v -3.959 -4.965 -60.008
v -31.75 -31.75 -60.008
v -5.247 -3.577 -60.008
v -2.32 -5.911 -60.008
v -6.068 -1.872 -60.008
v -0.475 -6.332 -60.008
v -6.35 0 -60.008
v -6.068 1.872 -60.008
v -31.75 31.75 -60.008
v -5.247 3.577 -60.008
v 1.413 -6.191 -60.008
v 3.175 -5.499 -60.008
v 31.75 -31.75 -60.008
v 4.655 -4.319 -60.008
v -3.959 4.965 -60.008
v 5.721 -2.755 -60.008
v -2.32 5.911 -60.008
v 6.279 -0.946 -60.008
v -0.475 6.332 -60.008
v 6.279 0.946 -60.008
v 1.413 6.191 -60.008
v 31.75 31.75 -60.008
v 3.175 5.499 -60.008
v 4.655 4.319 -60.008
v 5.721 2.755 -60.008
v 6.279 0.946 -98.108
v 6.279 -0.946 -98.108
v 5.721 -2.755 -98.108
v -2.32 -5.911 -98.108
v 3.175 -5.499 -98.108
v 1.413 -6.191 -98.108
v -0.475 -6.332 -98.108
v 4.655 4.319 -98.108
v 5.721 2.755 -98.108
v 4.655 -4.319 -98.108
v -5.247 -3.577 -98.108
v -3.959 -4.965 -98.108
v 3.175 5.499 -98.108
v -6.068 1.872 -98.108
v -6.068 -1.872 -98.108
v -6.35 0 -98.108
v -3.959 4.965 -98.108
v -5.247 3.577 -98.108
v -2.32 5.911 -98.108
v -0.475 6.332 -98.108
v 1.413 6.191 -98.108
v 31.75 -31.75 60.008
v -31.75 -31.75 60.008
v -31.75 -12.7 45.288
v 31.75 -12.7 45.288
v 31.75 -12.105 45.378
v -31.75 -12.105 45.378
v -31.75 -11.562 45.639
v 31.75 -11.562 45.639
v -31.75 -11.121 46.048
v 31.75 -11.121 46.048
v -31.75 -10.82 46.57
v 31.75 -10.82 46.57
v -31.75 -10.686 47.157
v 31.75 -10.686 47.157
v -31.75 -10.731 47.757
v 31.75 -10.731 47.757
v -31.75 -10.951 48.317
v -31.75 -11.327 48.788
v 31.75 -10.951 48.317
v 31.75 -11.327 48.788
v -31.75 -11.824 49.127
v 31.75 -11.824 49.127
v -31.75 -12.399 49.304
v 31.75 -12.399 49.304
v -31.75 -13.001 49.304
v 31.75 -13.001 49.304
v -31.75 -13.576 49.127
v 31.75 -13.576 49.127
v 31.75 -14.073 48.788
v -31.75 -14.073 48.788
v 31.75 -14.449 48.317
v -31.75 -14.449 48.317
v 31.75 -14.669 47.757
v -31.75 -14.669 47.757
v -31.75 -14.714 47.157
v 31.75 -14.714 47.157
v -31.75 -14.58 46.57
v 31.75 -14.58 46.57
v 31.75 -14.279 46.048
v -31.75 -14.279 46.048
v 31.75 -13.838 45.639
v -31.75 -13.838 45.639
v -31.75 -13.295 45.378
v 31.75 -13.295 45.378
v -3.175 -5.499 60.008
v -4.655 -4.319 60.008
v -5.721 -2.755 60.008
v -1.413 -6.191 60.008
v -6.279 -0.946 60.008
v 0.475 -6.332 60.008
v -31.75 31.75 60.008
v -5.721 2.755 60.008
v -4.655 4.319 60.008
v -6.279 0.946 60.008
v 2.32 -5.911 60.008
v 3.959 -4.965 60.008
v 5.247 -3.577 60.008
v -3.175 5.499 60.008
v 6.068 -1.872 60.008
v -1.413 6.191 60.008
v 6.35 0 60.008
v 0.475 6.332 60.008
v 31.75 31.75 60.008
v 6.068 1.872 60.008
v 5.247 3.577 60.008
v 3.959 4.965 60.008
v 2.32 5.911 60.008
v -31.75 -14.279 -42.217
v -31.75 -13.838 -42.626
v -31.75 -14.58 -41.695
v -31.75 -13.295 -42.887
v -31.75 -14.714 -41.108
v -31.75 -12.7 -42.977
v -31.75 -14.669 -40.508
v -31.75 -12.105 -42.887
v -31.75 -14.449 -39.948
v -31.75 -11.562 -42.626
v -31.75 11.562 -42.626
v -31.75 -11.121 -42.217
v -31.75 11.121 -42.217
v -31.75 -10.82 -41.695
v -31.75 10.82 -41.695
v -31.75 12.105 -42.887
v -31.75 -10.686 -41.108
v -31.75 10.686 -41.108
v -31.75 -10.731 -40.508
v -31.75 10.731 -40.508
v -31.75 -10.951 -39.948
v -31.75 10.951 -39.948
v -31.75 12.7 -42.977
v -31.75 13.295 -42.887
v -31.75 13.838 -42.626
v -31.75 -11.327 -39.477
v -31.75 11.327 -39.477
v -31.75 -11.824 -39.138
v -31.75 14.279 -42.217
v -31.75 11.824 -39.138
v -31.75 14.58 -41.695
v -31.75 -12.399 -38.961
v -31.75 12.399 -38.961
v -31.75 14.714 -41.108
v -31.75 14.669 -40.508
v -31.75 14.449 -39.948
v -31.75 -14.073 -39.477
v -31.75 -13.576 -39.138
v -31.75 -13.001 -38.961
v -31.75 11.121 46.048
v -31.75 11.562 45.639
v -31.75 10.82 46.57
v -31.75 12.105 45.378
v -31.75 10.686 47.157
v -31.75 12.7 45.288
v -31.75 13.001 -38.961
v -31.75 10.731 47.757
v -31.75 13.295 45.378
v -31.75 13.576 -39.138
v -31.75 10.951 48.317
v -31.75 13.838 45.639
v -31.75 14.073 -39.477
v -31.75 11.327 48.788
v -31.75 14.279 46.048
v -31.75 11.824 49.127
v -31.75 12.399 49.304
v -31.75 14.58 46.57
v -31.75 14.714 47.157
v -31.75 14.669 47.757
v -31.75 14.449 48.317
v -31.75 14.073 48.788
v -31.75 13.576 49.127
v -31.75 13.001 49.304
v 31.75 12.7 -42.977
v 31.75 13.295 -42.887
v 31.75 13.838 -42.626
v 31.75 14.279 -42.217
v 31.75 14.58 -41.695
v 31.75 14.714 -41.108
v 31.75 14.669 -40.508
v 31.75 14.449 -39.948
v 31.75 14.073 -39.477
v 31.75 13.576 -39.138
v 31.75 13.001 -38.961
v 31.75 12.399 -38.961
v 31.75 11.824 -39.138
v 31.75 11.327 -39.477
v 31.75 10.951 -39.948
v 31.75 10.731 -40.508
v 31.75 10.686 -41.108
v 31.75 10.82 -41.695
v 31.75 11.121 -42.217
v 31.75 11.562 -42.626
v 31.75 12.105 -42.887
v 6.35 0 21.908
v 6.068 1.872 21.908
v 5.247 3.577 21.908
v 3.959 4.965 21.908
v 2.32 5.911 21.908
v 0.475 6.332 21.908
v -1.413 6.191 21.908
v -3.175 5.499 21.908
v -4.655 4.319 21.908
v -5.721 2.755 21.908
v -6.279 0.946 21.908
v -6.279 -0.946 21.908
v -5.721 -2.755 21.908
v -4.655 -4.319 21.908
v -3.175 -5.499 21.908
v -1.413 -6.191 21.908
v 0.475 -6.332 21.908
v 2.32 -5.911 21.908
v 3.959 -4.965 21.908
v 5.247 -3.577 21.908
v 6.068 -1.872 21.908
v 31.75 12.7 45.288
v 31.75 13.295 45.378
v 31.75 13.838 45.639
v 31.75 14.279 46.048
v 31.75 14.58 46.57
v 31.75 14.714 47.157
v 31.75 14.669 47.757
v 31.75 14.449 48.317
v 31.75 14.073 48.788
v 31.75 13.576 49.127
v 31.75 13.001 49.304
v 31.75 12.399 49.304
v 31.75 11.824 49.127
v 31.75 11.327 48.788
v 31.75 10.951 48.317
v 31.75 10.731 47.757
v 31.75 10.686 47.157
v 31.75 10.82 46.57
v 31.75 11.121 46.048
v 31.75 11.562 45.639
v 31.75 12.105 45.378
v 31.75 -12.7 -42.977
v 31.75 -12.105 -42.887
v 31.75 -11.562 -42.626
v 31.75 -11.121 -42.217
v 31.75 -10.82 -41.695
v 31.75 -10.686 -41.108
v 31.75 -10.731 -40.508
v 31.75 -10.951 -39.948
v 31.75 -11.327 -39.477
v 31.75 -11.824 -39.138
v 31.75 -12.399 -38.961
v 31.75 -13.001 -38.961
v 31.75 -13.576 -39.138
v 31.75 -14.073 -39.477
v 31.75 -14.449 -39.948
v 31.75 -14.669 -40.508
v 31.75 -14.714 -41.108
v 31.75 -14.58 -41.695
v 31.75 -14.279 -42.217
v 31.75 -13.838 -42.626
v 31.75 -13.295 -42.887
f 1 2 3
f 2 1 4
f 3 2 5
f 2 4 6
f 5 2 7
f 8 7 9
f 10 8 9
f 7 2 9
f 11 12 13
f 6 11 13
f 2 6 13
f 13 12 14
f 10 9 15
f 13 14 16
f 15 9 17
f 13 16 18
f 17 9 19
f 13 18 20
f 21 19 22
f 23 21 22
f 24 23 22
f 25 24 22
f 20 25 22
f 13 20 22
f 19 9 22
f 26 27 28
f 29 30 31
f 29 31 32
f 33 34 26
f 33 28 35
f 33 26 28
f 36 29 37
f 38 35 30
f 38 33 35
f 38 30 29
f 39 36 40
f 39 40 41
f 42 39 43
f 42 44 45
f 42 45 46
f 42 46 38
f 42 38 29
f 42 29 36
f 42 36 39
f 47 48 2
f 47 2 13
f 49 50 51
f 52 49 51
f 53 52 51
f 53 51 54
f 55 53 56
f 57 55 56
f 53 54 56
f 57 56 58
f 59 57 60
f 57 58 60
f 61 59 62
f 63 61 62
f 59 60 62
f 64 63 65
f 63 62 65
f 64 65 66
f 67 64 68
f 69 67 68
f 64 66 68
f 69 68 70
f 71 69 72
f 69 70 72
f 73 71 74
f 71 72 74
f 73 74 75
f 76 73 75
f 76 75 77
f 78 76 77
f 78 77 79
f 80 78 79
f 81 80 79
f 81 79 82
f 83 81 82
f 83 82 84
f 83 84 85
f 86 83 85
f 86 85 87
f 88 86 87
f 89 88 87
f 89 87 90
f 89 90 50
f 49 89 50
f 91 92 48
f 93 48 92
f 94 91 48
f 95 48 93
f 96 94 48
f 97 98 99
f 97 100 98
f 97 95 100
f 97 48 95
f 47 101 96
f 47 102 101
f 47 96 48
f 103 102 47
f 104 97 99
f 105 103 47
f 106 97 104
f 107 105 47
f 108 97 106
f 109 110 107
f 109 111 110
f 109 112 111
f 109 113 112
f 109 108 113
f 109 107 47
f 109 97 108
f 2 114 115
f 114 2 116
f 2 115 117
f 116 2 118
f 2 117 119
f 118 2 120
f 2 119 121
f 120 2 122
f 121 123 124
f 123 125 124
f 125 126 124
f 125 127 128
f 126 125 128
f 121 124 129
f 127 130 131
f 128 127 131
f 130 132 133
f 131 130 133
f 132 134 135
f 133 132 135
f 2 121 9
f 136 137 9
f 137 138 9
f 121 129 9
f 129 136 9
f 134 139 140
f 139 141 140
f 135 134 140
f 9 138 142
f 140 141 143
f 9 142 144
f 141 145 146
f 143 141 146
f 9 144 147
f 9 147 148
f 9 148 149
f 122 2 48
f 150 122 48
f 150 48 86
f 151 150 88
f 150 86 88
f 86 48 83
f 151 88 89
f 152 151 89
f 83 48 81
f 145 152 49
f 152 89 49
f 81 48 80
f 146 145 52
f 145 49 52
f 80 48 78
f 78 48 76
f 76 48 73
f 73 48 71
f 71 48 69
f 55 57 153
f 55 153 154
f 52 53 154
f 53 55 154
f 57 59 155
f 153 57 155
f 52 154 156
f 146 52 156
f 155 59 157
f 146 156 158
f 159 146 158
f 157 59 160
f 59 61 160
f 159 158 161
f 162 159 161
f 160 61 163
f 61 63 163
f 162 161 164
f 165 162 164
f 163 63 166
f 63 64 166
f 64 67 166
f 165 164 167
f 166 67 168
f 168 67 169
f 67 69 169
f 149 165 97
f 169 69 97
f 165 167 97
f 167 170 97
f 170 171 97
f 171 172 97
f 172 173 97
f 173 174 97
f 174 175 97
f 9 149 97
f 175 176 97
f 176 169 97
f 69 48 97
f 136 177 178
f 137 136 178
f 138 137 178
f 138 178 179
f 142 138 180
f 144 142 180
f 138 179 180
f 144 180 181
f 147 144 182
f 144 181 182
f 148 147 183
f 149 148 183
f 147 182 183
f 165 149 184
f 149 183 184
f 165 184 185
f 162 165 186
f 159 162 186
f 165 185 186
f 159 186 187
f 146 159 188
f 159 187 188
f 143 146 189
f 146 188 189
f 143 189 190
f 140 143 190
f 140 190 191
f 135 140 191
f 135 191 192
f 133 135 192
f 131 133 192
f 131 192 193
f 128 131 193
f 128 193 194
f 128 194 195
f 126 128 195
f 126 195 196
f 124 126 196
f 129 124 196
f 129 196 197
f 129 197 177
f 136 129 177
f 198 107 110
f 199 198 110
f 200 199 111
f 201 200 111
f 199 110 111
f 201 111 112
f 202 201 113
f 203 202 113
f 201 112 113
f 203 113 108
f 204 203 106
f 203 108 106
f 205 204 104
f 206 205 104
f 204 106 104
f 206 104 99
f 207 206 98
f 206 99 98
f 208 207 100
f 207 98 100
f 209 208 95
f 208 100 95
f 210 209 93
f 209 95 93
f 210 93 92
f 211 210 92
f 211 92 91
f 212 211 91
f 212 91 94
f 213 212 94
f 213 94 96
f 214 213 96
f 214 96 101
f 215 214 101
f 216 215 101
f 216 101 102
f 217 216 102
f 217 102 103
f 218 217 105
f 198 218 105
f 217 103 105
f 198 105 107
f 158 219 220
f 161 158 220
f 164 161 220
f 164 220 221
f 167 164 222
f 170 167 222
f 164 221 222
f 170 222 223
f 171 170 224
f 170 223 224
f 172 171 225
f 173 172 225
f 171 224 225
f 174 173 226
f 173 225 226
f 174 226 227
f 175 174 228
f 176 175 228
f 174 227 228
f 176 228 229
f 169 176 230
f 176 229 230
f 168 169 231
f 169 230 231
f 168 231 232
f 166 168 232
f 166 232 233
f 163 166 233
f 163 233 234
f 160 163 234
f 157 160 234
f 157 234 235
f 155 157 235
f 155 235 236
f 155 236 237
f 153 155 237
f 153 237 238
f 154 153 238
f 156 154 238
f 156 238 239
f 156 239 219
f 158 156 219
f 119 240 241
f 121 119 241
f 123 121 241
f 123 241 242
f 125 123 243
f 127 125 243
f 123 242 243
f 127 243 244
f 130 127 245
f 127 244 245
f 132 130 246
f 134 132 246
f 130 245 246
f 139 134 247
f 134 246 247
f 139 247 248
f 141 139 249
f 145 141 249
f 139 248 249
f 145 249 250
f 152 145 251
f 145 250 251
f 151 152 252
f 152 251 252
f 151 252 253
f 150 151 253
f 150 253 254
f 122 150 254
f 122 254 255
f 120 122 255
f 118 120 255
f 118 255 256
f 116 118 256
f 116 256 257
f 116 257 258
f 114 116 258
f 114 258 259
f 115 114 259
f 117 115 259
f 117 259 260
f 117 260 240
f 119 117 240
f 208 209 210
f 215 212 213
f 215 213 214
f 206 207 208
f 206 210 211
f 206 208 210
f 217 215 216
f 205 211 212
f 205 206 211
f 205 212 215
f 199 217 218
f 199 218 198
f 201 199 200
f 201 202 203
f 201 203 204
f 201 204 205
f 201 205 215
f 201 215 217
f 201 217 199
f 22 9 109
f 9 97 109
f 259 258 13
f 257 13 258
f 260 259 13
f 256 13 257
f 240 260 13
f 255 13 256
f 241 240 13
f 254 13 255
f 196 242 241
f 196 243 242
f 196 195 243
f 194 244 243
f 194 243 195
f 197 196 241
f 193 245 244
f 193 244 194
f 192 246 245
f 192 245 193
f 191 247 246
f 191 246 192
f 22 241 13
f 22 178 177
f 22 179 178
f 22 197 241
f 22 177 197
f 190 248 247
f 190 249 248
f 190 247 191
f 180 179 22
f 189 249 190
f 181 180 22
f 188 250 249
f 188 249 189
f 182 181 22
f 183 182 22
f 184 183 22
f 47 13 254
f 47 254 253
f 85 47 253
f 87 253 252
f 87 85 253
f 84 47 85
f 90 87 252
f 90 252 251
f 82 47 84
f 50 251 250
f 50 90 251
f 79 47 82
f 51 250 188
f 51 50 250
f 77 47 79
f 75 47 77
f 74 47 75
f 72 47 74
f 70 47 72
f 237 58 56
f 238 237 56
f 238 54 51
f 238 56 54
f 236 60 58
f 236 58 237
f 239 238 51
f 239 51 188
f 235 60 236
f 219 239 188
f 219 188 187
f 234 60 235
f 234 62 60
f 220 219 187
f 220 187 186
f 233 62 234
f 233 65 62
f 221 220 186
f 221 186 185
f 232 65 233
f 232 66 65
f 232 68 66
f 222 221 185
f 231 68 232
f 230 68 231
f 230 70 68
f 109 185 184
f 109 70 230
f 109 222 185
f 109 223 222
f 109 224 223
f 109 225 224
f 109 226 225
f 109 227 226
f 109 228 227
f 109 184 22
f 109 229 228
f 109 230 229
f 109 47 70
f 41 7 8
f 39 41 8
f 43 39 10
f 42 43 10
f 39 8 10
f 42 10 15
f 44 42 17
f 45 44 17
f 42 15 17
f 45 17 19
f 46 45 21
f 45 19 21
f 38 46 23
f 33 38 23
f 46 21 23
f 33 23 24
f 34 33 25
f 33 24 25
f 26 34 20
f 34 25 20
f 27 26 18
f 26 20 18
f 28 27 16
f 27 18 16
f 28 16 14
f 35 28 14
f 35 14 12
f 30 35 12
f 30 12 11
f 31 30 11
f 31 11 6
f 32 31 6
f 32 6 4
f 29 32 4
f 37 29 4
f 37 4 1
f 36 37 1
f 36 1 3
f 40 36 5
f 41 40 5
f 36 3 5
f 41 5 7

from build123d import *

# Parameters (mm, degrees)
SKETCH1_W              = 63.5
SKETCH1_H              = 63.5
BOSS_EXTRUDE1_DEPTH    = 60.0075
SKETCH2_R              = 6.35
BOSS_EXTRUDE2_DEPTH    = 38.1
SKETCH3_R              = 6.35
CUT_EXTRUDE1_DEPTH     = 38.1
F_10_32_TAPPED_HOLE1_D = 4.0386


with BuildPart() as part:
    # Sketch1 → Boss-Extrude1 (new body, symmetric)
    with BuildSketch(Plane.XY):
        Rectangle(SKETCH1_W, SKETCH1_H)
    extrude(amount=BOSS_EXTRUDE1_DEPTH, both=True)

    # Sketch2 → Boss-Extrude2 (add)
    with BuildSketch(Plane(origin=(0, 0, -60.0075), x_dir=(-1, 0, 0), z_dir=(0, 0, -1))):
        Circle(SKETCH2_R)
    extrude(amount=BOSS_EXTRUDE2_DEPTH)

    # Sketch3 → Cut-Extrude1 (cut)
    with BuildSketch(Plane.XY.offset(60.0075)):
        Circle(SKETCH3_R)
    extrude(amount=-CUT_EXTRUDE1_DEPTH, mode=Mode.SUBTRACT)

    # #10-32 Tapped Hole1 (through all)
    with Locations(Plane.ZY.offset(31.75)):
        with Locations((-40.9575, 12.7), (-40.9575, -12.7), (47.3075, -12.7), (47.3075, 12.7)):
            Hole(F_10_32_TAPPED_HOLE1_D / 2)


solid = part.part
